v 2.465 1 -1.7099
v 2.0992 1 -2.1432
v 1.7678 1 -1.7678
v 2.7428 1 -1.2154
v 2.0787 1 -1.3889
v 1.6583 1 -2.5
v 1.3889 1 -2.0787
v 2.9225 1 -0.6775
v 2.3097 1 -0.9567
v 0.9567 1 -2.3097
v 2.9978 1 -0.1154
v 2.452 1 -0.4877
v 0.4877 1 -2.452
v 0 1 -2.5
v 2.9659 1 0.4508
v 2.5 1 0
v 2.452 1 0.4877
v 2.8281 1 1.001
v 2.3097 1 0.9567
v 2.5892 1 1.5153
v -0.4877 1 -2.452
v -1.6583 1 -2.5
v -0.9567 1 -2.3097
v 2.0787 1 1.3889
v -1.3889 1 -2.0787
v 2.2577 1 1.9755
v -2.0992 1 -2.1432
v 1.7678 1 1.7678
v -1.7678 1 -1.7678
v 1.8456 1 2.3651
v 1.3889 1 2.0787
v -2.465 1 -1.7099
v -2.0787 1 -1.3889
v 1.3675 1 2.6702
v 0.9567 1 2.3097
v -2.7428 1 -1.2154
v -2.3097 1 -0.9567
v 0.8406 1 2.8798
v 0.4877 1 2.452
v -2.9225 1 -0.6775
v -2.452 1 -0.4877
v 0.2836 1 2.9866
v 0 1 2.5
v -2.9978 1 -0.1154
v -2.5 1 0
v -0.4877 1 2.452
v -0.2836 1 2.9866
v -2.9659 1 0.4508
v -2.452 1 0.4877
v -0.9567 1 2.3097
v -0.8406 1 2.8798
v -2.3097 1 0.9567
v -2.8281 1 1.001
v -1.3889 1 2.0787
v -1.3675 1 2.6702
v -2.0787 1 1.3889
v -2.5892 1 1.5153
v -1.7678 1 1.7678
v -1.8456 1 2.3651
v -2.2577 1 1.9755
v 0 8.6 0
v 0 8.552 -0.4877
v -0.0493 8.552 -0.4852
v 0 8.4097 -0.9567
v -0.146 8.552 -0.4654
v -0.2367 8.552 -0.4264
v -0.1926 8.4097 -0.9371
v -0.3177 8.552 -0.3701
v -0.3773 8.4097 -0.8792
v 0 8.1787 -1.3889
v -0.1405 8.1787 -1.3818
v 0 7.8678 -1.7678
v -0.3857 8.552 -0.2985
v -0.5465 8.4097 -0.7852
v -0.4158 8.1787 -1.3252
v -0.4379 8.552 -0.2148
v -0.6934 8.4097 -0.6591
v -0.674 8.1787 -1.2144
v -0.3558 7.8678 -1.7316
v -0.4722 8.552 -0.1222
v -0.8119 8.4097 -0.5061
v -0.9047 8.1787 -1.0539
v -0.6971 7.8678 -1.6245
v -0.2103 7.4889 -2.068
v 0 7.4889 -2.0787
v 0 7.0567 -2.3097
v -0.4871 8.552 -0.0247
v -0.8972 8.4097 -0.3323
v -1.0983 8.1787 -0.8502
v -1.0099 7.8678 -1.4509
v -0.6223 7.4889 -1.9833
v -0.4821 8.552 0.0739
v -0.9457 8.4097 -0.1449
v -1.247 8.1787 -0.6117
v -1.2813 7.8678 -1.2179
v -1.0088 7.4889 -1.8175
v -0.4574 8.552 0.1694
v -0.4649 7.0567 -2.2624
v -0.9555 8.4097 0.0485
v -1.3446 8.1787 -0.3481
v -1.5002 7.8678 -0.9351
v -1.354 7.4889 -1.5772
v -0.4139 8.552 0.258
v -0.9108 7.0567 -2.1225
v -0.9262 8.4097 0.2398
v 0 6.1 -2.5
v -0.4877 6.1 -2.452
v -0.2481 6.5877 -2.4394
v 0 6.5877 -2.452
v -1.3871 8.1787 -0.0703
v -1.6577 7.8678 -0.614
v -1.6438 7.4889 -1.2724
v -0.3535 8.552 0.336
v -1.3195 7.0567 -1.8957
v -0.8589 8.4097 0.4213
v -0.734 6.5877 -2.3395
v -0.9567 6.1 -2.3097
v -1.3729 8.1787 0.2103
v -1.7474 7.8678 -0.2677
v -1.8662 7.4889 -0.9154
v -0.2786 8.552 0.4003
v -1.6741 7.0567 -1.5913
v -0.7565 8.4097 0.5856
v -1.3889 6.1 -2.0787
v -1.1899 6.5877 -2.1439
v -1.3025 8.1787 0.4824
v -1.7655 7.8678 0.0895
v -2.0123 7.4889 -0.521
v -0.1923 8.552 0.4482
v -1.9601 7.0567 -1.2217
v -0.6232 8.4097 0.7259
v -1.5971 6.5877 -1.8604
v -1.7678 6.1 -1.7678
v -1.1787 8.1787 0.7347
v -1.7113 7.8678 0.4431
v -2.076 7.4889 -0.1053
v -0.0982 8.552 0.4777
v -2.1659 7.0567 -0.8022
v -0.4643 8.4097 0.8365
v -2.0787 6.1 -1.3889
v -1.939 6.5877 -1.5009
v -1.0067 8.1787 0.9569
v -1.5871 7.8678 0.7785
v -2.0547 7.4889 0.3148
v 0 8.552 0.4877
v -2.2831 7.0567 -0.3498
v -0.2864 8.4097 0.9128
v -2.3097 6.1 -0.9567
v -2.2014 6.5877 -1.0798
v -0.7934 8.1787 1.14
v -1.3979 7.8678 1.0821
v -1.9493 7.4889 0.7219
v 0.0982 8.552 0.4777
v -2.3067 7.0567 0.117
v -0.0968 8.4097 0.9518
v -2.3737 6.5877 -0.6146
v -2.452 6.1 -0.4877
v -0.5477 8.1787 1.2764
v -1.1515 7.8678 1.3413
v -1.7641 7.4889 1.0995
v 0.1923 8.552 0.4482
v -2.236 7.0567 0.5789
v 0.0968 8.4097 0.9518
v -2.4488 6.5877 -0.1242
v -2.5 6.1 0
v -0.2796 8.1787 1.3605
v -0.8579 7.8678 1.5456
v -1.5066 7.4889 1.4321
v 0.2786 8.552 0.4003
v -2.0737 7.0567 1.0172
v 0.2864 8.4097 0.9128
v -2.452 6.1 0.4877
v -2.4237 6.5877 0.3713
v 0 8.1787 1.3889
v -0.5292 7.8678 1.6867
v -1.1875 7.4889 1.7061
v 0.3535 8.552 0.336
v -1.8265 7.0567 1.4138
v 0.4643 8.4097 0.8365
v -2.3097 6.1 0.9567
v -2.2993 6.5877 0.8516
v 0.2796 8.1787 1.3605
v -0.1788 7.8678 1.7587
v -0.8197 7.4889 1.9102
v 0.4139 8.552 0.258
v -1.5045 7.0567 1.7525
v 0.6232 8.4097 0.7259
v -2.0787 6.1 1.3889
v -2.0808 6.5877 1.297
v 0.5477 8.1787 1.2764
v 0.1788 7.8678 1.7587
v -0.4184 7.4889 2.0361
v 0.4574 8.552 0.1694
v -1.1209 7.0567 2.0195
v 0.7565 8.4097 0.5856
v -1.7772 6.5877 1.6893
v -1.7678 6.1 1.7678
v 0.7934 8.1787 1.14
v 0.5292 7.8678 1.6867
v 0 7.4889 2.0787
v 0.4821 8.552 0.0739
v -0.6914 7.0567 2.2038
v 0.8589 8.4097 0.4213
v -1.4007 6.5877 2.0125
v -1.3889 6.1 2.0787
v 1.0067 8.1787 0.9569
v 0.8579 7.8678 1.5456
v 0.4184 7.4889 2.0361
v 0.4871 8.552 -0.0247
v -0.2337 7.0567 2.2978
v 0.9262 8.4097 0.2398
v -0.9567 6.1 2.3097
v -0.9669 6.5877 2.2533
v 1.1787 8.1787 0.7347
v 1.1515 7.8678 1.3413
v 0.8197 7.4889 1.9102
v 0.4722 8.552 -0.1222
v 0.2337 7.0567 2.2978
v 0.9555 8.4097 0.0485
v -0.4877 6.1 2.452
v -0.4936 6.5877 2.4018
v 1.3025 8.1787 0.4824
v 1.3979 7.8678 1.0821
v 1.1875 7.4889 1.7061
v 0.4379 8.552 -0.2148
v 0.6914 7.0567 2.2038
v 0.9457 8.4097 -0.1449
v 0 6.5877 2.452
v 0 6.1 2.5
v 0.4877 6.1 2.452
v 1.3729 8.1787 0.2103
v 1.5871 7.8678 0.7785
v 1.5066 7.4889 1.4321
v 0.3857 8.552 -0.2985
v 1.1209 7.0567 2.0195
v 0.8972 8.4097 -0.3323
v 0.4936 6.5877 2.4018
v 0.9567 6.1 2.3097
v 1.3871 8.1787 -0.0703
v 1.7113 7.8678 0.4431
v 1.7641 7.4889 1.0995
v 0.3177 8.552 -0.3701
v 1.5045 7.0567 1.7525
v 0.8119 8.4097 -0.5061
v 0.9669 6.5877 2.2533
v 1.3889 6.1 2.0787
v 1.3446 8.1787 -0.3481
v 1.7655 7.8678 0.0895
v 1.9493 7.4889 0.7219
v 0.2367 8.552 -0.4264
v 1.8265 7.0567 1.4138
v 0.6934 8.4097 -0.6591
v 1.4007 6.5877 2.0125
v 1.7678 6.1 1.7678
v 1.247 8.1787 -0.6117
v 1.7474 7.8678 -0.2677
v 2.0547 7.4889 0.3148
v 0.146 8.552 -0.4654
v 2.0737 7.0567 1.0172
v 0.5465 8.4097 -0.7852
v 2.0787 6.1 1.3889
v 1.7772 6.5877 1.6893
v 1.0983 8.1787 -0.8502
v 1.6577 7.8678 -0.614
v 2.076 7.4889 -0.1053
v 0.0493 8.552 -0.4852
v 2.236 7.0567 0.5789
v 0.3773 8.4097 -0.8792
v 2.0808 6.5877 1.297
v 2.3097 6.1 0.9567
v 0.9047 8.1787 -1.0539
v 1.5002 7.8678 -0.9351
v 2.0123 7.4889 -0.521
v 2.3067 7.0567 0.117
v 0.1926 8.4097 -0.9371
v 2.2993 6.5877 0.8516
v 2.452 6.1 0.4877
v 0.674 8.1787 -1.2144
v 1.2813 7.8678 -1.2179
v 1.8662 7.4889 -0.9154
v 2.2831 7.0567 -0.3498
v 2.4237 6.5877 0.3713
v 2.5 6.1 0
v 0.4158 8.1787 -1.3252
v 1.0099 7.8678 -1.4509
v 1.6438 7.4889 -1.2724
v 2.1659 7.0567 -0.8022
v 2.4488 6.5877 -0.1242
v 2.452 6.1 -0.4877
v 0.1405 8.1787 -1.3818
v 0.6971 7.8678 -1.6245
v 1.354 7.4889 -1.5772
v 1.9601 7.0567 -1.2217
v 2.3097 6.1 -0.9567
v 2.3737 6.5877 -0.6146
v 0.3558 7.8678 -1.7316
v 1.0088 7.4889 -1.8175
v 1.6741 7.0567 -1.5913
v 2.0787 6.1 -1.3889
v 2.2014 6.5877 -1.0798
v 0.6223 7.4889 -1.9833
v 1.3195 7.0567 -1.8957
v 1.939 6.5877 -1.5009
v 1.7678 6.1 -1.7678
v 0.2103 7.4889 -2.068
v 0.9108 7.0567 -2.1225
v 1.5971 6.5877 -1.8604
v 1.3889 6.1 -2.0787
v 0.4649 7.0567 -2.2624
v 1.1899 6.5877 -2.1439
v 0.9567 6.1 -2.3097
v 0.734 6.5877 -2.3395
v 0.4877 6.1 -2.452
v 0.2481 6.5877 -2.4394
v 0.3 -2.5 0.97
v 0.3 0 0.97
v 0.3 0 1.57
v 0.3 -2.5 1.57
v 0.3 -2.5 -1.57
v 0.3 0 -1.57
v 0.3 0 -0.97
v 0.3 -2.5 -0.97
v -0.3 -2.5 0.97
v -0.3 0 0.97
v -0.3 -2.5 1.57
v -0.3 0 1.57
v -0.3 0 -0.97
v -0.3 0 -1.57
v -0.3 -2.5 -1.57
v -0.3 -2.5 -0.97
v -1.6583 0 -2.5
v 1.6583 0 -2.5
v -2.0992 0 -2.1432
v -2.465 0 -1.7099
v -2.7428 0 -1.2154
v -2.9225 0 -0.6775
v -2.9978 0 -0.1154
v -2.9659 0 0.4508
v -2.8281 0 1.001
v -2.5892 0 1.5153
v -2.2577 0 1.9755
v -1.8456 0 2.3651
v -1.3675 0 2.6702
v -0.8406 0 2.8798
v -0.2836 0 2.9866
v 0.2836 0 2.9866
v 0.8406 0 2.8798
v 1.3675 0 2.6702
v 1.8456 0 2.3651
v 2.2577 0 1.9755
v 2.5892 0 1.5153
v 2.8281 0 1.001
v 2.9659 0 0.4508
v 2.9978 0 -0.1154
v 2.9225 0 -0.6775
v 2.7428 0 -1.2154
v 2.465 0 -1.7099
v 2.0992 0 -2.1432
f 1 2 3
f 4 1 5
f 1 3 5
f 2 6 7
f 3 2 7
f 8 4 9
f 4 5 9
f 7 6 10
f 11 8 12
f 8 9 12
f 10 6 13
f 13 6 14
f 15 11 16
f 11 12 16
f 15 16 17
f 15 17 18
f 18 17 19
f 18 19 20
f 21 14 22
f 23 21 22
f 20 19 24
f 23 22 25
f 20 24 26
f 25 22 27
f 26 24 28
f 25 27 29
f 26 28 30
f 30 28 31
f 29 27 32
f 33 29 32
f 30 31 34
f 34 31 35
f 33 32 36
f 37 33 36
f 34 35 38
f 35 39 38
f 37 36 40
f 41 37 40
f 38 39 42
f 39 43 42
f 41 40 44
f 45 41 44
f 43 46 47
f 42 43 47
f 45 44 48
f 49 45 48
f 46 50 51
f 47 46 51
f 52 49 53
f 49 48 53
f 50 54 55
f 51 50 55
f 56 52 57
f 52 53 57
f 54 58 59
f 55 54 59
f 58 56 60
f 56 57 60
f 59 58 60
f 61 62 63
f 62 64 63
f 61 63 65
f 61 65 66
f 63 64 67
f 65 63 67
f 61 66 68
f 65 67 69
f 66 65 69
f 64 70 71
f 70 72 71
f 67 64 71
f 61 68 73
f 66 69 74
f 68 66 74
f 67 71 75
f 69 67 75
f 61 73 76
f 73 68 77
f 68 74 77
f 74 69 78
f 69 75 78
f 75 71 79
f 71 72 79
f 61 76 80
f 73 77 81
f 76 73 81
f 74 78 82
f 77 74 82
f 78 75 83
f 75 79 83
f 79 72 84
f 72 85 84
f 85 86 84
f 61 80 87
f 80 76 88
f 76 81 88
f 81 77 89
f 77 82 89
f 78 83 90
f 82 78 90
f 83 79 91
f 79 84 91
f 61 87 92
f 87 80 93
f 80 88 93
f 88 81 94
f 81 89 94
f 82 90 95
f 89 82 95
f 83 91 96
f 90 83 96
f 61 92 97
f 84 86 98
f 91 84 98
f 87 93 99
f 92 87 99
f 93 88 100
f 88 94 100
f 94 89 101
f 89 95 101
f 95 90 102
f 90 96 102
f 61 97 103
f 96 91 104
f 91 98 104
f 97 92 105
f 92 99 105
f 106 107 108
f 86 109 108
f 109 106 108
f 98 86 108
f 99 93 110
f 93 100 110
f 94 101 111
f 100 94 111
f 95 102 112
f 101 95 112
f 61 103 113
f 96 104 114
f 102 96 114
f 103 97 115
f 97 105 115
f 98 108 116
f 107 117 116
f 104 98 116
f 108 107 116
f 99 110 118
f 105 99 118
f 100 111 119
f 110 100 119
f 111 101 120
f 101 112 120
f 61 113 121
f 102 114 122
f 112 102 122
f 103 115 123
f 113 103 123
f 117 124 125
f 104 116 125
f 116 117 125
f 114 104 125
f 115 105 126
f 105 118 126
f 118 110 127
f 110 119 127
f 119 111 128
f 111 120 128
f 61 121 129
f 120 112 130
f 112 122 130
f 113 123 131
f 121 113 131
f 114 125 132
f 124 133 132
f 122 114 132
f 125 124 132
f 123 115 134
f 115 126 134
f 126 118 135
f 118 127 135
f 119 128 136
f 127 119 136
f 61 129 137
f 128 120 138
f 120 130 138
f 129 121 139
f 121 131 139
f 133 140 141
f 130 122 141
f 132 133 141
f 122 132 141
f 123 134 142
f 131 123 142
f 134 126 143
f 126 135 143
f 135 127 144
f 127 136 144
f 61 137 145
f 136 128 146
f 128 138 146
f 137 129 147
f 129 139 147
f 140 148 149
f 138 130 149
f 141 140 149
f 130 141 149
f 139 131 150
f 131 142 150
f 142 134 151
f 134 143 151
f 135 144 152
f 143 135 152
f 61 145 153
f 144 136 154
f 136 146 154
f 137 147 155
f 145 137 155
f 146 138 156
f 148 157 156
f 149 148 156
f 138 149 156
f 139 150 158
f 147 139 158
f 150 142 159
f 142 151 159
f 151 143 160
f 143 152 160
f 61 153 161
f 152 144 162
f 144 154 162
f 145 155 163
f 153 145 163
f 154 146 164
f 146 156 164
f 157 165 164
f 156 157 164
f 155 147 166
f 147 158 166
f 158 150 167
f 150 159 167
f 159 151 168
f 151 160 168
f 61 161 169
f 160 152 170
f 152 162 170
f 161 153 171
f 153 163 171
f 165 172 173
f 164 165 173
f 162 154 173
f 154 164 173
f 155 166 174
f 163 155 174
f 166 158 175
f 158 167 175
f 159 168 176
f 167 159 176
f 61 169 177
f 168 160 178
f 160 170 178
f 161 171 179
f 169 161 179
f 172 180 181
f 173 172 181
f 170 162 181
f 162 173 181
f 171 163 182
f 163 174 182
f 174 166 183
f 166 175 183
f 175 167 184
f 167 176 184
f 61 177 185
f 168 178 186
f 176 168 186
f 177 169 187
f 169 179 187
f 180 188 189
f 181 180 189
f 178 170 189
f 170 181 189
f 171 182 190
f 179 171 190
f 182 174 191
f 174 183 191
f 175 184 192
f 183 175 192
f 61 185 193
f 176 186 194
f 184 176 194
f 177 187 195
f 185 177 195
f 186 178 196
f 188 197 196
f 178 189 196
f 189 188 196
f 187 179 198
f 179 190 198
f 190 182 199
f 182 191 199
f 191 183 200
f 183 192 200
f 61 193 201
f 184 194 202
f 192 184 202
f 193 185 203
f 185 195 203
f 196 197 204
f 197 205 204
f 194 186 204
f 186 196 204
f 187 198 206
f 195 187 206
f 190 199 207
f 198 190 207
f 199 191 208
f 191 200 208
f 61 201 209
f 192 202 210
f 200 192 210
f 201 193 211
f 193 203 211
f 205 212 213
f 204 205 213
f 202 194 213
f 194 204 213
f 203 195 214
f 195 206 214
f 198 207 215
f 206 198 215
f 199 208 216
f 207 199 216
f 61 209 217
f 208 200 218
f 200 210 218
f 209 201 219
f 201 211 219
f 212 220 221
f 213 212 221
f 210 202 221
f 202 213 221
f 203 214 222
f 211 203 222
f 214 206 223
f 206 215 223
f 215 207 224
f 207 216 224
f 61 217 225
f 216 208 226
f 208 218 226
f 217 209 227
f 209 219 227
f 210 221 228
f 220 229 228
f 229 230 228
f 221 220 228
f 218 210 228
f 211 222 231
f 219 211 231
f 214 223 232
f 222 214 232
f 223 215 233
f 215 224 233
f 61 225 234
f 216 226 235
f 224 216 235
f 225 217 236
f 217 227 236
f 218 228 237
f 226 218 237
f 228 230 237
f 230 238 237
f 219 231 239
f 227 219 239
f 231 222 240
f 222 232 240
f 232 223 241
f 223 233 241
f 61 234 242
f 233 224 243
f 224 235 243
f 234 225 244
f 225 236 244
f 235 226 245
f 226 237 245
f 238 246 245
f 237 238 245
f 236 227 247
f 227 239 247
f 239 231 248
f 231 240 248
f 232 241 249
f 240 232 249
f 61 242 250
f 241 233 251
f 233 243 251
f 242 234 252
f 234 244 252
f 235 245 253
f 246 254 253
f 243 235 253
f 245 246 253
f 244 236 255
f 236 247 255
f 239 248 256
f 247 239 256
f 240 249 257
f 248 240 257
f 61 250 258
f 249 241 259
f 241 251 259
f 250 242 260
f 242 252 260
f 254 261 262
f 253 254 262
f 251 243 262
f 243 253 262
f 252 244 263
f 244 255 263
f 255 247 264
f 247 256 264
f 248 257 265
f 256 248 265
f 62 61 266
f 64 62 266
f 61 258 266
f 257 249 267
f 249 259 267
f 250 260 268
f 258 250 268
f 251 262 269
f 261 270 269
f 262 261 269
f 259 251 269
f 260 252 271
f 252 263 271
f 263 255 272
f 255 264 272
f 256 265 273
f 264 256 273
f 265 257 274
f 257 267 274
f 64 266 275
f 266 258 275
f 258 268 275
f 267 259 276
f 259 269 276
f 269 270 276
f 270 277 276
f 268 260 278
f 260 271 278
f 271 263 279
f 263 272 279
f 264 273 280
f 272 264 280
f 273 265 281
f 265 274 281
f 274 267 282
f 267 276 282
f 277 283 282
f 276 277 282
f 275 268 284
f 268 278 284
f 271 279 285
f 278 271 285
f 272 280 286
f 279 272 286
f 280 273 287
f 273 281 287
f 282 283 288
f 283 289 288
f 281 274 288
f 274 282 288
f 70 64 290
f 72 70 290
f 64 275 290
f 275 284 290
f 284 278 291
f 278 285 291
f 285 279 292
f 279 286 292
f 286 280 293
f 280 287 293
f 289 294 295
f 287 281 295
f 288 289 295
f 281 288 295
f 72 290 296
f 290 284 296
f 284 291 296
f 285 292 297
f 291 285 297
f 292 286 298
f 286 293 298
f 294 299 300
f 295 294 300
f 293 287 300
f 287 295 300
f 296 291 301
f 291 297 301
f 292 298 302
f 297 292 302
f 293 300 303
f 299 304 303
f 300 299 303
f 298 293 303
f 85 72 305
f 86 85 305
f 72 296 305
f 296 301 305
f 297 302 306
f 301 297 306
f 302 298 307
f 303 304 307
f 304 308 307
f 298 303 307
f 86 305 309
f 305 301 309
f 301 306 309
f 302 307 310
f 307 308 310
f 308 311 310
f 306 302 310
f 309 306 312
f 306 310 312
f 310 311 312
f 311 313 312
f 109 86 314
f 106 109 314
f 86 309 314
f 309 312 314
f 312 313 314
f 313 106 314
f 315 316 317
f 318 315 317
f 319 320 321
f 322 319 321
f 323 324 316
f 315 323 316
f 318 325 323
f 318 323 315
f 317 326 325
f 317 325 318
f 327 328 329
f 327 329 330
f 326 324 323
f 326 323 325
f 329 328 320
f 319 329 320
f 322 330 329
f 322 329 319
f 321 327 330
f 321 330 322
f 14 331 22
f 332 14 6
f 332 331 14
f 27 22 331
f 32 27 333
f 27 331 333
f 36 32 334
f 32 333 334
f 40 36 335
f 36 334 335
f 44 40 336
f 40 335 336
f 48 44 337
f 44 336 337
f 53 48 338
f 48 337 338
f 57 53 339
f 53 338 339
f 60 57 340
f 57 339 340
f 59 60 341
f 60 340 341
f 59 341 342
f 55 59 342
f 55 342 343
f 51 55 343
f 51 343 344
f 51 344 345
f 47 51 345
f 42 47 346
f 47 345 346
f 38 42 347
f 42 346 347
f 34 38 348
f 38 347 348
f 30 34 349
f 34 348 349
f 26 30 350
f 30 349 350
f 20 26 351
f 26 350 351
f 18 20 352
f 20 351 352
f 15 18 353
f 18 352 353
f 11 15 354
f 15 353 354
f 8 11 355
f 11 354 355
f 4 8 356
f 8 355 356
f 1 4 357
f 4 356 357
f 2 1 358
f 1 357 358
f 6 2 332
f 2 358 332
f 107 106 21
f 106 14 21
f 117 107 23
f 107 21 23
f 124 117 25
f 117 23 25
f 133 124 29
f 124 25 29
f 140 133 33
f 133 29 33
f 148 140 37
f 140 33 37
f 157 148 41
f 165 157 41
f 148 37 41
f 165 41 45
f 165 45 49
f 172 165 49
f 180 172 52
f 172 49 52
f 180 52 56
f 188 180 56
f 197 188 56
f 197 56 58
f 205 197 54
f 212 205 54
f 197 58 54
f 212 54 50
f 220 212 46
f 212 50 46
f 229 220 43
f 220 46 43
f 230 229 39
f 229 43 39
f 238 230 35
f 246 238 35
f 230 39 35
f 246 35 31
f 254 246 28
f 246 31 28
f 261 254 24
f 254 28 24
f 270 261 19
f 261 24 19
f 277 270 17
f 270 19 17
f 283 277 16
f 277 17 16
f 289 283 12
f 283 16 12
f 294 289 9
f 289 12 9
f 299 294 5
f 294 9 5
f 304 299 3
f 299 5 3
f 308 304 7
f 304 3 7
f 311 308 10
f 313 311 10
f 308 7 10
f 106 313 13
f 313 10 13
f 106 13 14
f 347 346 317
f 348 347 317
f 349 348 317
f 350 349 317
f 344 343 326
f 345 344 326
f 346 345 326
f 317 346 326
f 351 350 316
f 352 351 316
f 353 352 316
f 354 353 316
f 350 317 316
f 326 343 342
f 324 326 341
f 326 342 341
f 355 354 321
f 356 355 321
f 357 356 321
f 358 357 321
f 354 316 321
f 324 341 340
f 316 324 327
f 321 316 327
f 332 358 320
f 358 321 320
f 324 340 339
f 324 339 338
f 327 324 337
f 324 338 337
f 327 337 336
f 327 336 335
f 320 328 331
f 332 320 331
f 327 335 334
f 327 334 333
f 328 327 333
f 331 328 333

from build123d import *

# Parameters (mm, degrees)
ESBO_O4_W                = 7.252623502
ESBO_O4_H                = 0.751020135
CORTE_EXTRUS_O1_DEPTH    = 1
ESBO_O5_W                = 0.6
ESBO_O5_H                = 0.6
RESSALTO_EXTRUS_O1_DEPTH = 27
ESBO_O6_W                = 0.6
ESBO_O6_H                = 0.6
CORTE_EXTRUS_O2_DEPTH    = 1.5
ESBO_O27_R               = 4.624654595
CORTE_EXTRUS_O3_DEPTH    = 24.5


with BuildPart() as part:
    # Esboço1 → Revolução1 (revolve)
    with BuildSketch(Plane(origin=(0, 0, 0), x_dir=(0, 0, -1), z_dir=(1, 0, 0))):
        with BuildLine():
            Line((0, 0), (0, 8.6))
            ThreePointArc((0, 8.6), (1.767766953, 7.867766953), (2.5, 6.1))
            Line((2.5, 6.1), (2.5, 1))
            Line((2.5, 1), (3, 1))
            Line((3, 1), (3, 0))
            Line((3, 0), (0, 0))
        make_face()
    revolve(axis=Axis((0, 0, 0), (0, 1, 0)))

    # Esboço4 → Corte-extrusão1 (cut)
    with BuildSketch(Plane(origin=(0, 0, 0), x_dir=(1, 0, 0), z_dir=(0, 1, 0))):
        with Locations((0, 2.875510068)):
            Rectangle(ESBO_O4_W, ESBO_O4_H)
    extrude(amount=CORTE_EXTRUS_O1_DEPTH, mode=Mode.SUBTRACT)

    # Esboço5 → Ressalto-extrusão1 (add)
    with BuildSketch(Plane.XZ):
        with Locations((0, 1.27)):
            Rectangle(ESBO_O5_W, ESBO_O5_H)
        with Locations((0, -1.27)):
            Rectangle(ESBO_O5_W, ESBO_O5_H)
    extrude(amount=RESSALTO_EXTRUS_O1_DEPTH)

    # Esboço6 → Corte-extrusão2 (cut)
    with BuildSketch(Plane.XZ.offset(27)):
        with Locations((0, -1.27)):
            Rectangle(ESBO_O6_W, ESBO_O6_H)
    extrude(amount=-CORTE_EXTRUS_O2_DEPTH, mode=Mode.SUBTRACT)

    # Esboço27 → Corte-extrusão3 (cut)
    with BuildSketch(Plane.XZ.offset(27)):
        Circle(ESBO_O27_R)
    extrude(amount=-CORTE_EXTRUS_O3_DEPTH, mode=Mode.SUBTRACT)


solid = part.part
